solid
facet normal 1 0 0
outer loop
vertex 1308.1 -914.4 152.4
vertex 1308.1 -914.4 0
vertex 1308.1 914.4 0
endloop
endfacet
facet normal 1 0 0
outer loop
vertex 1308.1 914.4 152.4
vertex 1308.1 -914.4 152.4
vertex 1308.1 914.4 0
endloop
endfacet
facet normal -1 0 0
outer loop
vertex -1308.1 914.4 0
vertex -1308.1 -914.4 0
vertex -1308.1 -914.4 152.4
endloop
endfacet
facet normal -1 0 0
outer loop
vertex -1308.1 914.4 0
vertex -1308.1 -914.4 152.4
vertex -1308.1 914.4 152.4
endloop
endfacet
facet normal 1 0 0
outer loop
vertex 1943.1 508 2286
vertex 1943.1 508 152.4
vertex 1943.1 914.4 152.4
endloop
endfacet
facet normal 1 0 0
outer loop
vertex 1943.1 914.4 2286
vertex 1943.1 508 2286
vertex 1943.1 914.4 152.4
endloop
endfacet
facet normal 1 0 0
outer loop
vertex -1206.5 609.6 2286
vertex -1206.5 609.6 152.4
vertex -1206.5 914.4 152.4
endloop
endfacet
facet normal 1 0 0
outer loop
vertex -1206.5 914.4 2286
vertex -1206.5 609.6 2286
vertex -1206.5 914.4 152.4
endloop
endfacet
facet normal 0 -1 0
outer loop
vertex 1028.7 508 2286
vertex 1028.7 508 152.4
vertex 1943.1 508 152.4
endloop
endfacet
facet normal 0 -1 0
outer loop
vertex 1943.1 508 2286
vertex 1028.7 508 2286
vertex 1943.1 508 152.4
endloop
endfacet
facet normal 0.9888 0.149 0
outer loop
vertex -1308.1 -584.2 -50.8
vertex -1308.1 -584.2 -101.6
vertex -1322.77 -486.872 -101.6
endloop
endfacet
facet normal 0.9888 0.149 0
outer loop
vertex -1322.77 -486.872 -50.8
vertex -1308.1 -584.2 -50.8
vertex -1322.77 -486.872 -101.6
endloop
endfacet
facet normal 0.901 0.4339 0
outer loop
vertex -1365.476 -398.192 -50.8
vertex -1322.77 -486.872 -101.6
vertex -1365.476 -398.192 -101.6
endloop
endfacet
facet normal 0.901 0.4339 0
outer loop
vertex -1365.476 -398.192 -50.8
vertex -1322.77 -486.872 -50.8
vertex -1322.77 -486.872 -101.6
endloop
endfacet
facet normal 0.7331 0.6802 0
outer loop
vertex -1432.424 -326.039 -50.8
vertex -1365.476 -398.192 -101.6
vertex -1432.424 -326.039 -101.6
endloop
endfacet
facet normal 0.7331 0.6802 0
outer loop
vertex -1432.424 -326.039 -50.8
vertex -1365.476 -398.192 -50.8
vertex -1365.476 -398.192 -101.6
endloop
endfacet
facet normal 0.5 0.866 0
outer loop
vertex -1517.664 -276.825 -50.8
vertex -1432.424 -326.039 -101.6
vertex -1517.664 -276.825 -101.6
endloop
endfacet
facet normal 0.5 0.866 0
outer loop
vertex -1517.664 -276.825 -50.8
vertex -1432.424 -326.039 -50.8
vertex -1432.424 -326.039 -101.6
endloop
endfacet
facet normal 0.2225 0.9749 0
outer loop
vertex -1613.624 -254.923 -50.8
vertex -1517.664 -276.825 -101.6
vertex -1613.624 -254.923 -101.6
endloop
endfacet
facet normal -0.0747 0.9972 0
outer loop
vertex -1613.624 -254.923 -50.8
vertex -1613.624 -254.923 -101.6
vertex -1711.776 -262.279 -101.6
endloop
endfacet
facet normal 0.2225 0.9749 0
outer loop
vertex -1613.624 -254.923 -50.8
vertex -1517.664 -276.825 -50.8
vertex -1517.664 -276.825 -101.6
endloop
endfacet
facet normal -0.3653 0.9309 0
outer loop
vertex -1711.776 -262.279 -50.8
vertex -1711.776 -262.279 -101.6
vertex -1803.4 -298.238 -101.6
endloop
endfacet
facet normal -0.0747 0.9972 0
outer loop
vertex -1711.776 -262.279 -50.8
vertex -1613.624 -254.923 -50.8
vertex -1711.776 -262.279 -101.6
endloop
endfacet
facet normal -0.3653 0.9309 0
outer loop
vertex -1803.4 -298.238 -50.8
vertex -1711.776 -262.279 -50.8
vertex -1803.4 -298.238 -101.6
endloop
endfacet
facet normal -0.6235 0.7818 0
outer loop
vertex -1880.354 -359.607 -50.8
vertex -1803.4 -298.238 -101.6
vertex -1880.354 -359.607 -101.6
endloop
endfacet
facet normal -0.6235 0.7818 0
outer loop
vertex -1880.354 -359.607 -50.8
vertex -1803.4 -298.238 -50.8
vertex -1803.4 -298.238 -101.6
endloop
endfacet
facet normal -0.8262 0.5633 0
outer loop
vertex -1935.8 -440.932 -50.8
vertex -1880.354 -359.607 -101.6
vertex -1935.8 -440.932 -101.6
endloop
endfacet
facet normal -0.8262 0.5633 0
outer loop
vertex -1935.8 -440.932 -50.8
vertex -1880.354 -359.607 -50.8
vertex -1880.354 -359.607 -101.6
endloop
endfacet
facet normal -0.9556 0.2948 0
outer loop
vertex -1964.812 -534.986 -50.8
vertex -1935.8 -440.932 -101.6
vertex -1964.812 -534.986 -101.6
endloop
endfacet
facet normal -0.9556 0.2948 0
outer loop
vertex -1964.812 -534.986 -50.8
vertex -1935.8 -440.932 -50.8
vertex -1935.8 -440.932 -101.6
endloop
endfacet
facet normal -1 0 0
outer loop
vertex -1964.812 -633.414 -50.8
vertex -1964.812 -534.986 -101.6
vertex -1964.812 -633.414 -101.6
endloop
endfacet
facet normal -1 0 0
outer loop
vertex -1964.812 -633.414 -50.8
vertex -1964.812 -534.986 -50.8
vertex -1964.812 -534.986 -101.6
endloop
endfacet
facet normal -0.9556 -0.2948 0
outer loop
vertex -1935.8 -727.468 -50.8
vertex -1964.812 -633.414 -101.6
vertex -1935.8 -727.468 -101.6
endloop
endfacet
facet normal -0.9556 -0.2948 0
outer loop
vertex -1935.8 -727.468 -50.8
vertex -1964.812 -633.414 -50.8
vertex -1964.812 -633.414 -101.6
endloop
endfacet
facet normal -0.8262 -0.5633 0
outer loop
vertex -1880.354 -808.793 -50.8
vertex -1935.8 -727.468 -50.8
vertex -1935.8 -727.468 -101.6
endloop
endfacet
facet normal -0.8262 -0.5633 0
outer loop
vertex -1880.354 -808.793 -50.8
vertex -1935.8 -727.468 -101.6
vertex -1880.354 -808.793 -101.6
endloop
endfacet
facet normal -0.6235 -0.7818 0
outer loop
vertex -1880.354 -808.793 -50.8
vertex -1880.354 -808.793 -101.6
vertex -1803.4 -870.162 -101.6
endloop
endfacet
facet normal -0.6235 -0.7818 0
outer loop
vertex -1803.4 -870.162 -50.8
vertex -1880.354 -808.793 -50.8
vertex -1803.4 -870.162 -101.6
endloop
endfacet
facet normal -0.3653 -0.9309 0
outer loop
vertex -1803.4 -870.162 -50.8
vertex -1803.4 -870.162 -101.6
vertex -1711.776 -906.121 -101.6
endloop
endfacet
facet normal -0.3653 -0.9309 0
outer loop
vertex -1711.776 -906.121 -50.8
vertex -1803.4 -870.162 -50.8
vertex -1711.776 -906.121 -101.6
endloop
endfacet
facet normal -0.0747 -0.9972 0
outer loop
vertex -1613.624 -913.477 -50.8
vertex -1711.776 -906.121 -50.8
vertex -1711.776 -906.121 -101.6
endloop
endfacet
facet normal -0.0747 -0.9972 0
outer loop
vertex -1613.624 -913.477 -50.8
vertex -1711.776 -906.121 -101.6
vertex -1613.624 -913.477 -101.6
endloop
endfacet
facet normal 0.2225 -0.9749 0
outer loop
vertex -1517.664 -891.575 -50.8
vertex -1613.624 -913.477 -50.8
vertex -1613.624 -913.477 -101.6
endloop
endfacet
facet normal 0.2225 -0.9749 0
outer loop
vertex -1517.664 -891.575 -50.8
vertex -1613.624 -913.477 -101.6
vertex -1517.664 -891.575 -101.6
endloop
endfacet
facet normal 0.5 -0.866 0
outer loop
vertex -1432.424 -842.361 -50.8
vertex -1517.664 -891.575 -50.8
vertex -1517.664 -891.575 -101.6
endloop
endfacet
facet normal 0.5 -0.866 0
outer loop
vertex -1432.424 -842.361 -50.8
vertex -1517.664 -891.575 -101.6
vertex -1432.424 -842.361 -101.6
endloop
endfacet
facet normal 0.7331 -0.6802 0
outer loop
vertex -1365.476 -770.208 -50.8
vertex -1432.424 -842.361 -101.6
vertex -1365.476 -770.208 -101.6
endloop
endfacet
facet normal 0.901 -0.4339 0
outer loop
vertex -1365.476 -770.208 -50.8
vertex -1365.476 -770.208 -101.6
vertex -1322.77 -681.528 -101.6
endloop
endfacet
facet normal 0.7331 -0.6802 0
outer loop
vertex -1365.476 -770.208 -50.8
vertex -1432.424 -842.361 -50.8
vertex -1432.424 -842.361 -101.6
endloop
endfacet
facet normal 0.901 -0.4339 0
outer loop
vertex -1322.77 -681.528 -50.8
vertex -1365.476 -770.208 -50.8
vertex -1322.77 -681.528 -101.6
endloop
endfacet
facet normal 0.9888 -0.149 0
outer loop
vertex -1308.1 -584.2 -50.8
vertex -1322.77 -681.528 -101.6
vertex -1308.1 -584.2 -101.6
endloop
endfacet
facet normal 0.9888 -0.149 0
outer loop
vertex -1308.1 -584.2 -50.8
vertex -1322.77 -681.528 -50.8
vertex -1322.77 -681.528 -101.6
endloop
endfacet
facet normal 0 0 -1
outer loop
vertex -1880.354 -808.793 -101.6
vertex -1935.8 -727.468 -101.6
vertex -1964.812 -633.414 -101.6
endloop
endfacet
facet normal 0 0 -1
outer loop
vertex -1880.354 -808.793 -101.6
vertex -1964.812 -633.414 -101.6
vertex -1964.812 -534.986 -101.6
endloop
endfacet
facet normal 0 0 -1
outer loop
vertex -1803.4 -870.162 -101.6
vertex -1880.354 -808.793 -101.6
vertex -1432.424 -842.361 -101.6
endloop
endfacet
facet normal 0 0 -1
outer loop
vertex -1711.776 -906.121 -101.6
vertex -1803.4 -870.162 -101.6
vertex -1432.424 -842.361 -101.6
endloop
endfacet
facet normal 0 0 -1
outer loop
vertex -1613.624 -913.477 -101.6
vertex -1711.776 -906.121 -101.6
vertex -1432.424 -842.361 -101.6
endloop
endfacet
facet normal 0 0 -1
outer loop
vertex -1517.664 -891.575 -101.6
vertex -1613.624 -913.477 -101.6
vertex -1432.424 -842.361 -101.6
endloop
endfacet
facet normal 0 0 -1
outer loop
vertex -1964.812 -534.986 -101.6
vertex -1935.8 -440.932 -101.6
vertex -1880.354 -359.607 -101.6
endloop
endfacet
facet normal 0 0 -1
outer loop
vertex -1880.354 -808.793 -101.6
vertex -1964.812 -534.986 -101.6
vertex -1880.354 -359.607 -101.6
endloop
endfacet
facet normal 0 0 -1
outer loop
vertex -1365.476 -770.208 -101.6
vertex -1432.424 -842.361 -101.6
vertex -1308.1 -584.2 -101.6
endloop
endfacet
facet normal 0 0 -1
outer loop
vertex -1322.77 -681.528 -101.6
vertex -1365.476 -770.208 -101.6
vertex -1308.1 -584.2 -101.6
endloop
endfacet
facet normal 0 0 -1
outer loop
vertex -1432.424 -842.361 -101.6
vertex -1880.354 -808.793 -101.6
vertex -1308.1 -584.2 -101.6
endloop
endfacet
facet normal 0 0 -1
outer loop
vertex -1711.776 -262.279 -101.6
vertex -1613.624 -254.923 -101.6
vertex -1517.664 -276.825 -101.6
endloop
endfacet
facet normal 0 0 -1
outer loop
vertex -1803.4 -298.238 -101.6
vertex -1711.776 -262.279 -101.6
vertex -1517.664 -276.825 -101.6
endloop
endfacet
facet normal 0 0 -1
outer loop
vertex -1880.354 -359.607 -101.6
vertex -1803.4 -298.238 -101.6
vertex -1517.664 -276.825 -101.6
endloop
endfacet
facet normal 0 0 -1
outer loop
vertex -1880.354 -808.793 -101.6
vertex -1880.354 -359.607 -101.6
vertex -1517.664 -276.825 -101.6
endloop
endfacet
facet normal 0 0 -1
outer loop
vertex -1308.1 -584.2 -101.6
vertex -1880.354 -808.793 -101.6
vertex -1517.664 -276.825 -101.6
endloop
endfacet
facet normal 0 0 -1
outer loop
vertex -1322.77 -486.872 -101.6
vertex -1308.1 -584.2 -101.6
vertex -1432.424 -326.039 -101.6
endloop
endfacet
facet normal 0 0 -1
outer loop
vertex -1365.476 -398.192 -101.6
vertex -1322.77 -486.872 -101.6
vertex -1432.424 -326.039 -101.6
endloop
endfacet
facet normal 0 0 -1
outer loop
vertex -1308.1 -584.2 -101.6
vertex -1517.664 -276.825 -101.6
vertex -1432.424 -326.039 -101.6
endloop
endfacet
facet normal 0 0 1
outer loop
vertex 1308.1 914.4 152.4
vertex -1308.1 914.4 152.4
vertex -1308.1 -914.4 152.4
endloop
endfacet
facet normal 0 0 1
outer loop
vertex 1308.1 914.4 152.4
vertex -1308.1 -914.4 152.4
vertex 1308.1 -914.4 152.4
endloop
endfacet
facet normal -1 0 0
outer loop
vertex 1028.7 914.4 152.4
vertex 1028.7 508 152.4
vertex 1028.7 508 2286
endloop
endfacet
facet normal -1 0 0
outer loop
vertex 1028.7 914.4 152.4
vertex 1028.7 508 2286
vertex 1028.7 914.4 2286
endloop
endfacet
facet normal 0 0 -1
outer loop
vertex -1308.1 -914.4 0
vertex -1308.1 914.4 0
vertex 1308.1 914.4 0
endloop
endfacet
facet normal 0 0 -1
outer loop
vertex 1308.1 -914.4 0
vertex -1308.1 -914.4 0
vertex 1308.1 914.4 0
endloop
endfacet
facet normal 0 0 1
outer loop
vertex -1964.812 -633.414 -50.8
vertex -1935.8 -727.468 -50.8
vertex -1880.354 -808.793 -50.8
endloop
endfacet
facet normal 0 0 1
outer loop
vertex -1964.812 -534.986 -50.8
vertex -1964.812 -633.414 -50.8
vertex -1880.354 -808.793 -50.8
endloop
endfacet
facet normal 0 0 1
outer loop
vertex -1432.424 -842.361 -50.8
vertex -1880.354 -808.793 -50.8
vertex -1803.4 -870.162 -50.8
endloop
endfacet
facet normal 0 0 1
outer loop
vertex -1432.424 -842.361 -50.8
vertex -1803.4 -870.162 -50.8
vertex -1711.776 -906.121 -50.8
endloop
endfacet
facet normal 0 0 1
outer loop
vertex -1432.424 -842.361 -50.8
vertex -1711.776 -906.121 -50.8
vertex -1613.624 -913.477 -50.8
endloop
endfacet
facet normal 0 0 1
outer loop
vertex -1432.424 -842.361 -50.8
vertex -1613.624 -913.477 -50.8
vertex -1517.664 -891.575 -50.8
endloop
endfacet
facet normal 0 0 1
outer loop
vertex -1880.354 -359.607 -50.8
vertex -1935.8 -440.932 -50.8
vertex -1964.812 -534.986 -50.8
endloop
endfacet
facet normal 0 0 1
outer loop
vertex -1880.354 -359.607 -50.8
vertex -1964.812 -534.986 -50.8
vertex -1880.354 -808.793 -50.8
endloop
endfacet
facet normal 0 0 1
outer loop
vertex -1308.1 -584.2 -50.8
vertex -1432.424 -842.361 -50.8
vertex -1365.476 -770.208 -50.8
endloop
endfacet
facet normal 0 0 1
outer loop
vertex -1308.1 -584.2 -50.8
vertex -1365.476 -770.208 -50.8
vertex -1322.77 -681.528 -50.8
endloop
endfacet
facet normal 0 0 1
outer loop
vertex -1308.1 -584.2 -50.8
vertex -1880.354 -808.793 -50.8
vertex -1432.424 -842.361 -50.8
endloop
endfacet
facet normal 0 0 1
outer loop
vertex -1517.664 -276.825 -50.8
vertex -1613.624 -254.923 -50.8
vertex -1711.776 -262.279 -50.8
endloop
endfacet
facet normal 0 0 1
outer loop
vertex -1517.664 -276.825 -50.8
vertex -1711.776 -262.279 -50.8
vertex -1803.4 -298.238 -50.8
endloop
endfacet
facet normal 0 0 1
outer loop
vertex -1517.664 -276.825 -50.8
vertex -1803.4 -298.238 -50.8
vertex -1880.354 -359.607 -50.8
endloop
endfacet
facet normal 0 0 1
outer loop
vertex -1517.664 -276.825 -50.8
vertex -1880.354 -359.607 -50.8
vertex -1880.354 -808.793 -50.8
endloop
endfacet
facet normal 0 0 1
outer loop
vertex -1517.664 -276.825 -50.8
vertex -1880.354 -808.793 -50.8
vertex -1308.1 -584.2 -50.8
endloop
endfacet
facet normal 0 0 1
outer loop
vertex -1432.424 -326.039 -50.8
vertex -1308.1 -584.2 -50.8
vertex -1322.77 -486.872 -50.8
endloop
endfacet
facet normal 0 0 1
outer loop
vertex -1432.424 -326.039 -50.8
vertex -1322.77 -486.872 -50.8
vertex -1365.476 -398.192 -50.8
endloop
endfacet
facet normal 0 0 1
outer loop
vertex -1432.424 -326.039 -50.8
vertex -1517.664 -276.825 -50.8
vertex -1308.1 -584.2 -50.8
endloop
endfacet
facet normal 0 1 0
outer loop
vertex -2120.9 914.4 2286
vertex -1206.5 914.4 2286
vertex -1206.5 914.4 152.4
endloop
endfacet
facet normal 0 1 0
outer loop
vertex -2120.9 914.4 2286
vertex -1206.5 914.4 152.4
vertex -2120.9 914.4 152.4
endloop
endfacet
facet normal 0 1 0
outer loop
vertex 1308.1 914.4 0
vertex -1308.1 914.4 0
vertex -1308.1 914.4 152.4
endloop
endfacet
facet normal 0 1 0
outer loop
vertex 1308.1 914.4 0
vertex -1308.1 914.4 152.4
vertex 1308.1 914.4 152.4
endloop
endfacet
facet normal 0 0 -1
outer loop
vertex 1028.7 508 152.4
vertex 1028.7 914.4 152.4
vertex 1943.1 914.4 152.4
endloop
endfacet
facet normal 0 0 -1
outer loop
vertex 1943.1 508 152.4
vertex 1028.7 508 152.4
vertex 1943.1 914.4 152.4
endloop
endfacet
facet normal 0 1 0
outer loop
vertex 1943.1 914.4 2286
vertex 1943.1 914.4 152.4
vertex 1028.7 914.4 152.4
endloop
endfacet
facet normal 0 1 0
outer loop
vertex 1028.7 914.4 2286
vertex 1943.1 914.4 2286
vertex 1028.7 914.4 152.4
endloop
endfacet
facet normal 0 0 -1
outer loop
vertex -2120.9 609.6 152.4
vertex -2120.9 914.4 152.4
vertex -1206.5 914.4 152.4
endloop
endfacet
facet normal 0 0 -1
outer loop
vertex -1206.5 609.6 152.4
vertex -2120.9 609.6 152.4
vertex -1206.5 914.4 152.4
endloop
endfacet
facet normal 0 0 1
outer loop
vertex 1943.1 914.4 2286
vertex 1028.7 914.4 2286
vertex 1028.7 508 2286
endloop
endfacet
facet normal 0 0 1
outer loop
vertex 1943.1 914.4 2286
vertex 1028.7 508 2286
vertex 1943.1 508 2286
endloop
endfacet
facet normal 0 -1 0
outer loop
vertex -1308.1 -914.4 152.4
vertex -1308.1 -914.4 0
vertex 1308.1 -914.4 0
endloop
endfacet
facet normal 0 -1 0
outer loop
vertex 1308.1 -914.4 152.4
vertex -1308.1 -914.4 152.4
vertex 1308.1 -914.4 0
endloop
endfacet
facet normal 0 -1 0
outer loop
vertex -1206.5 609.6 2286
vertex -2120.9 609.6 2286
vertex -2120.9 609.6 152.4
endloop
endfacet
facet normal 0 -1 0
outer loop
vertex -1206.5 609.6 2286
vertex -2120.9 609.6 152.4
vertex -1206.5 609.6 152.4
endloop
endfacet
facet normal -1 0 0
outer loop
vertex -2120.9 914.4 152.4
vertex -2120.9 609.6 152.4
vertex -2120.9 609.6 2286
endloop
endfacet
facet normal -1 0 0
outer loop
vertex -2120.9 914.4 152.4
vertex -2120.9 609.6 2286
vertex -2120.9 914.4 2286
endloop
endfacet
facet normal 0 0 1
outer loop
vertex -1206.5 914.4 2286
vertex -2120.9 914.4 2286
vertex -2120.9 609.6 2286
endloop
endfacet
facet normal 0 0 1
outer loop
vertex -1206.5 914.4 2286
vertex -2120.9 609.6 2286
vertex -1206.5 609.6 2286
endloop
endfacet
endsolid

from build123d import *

# Parameters (mm, degrees)
F1_W     = 2616.2
F1_H     = 1828.8
F2_DEPTH = 152.4
F3_W     = 812.8
F3_H     = 304.8
F3_W_2   = 101.6
F4_DEPTH = 2133.6
F3_W_3   = 279.4
F3_H_2   = 406.4
F3_W_4   = 635
F6_R     = 330.2
F7_DEPTH = 50.8


# Not quite as in the source:
# - a variable given as a bare number and used for a length is read in inches; the dataset says mm whatever the document's units were


with BuildPart() as f2:
    # F1 (on Top) → F2 (new body)
    with BuildSketch(Plane.XY):
        Rectangle(F1_W, F1_H)
    extrude(amount=F2_DEPTH)


with BuildPart() as f4:
    # F3 (on face) → F4 (new body)
    with BuildSketch(Plane.XY.offset(152.4)):
        with Locations((-1714.5, 762)):
            Rectangle(F3_W, F3_H)
        with Locations((-1257.3, 762)):
            Rectangle(F3_W_2, F3_H)
    extrude(amount=F4_DEPTH)


with BuildPart() as f4b:
    # F3 (on face) → F4, piece 2 (new body)
    with BuildSketch(Plane.XY.offset(152.4)):
        with Locations((1168.4, 711.2)):
            Rectangle(F3_W_3, F3_H_2)
        with Locations((1625.6, 711.2)):
            Rectangle(F3_W_4, F3_H_2)
    extrude(amount=F4_DEPTH)


with BuildPart() as f7:
    # F6 (on offset) → F7 (new body)
    with BuildSketch(Plane.XY.offset(-50.8)):
        with Locations((-1638.3, -584.2)):
            Circle(F6_R)
    extrude(amount=-F7_DEPTH)


solid = Compound([f2.part, f4.part, f4b.part, f7.part])
